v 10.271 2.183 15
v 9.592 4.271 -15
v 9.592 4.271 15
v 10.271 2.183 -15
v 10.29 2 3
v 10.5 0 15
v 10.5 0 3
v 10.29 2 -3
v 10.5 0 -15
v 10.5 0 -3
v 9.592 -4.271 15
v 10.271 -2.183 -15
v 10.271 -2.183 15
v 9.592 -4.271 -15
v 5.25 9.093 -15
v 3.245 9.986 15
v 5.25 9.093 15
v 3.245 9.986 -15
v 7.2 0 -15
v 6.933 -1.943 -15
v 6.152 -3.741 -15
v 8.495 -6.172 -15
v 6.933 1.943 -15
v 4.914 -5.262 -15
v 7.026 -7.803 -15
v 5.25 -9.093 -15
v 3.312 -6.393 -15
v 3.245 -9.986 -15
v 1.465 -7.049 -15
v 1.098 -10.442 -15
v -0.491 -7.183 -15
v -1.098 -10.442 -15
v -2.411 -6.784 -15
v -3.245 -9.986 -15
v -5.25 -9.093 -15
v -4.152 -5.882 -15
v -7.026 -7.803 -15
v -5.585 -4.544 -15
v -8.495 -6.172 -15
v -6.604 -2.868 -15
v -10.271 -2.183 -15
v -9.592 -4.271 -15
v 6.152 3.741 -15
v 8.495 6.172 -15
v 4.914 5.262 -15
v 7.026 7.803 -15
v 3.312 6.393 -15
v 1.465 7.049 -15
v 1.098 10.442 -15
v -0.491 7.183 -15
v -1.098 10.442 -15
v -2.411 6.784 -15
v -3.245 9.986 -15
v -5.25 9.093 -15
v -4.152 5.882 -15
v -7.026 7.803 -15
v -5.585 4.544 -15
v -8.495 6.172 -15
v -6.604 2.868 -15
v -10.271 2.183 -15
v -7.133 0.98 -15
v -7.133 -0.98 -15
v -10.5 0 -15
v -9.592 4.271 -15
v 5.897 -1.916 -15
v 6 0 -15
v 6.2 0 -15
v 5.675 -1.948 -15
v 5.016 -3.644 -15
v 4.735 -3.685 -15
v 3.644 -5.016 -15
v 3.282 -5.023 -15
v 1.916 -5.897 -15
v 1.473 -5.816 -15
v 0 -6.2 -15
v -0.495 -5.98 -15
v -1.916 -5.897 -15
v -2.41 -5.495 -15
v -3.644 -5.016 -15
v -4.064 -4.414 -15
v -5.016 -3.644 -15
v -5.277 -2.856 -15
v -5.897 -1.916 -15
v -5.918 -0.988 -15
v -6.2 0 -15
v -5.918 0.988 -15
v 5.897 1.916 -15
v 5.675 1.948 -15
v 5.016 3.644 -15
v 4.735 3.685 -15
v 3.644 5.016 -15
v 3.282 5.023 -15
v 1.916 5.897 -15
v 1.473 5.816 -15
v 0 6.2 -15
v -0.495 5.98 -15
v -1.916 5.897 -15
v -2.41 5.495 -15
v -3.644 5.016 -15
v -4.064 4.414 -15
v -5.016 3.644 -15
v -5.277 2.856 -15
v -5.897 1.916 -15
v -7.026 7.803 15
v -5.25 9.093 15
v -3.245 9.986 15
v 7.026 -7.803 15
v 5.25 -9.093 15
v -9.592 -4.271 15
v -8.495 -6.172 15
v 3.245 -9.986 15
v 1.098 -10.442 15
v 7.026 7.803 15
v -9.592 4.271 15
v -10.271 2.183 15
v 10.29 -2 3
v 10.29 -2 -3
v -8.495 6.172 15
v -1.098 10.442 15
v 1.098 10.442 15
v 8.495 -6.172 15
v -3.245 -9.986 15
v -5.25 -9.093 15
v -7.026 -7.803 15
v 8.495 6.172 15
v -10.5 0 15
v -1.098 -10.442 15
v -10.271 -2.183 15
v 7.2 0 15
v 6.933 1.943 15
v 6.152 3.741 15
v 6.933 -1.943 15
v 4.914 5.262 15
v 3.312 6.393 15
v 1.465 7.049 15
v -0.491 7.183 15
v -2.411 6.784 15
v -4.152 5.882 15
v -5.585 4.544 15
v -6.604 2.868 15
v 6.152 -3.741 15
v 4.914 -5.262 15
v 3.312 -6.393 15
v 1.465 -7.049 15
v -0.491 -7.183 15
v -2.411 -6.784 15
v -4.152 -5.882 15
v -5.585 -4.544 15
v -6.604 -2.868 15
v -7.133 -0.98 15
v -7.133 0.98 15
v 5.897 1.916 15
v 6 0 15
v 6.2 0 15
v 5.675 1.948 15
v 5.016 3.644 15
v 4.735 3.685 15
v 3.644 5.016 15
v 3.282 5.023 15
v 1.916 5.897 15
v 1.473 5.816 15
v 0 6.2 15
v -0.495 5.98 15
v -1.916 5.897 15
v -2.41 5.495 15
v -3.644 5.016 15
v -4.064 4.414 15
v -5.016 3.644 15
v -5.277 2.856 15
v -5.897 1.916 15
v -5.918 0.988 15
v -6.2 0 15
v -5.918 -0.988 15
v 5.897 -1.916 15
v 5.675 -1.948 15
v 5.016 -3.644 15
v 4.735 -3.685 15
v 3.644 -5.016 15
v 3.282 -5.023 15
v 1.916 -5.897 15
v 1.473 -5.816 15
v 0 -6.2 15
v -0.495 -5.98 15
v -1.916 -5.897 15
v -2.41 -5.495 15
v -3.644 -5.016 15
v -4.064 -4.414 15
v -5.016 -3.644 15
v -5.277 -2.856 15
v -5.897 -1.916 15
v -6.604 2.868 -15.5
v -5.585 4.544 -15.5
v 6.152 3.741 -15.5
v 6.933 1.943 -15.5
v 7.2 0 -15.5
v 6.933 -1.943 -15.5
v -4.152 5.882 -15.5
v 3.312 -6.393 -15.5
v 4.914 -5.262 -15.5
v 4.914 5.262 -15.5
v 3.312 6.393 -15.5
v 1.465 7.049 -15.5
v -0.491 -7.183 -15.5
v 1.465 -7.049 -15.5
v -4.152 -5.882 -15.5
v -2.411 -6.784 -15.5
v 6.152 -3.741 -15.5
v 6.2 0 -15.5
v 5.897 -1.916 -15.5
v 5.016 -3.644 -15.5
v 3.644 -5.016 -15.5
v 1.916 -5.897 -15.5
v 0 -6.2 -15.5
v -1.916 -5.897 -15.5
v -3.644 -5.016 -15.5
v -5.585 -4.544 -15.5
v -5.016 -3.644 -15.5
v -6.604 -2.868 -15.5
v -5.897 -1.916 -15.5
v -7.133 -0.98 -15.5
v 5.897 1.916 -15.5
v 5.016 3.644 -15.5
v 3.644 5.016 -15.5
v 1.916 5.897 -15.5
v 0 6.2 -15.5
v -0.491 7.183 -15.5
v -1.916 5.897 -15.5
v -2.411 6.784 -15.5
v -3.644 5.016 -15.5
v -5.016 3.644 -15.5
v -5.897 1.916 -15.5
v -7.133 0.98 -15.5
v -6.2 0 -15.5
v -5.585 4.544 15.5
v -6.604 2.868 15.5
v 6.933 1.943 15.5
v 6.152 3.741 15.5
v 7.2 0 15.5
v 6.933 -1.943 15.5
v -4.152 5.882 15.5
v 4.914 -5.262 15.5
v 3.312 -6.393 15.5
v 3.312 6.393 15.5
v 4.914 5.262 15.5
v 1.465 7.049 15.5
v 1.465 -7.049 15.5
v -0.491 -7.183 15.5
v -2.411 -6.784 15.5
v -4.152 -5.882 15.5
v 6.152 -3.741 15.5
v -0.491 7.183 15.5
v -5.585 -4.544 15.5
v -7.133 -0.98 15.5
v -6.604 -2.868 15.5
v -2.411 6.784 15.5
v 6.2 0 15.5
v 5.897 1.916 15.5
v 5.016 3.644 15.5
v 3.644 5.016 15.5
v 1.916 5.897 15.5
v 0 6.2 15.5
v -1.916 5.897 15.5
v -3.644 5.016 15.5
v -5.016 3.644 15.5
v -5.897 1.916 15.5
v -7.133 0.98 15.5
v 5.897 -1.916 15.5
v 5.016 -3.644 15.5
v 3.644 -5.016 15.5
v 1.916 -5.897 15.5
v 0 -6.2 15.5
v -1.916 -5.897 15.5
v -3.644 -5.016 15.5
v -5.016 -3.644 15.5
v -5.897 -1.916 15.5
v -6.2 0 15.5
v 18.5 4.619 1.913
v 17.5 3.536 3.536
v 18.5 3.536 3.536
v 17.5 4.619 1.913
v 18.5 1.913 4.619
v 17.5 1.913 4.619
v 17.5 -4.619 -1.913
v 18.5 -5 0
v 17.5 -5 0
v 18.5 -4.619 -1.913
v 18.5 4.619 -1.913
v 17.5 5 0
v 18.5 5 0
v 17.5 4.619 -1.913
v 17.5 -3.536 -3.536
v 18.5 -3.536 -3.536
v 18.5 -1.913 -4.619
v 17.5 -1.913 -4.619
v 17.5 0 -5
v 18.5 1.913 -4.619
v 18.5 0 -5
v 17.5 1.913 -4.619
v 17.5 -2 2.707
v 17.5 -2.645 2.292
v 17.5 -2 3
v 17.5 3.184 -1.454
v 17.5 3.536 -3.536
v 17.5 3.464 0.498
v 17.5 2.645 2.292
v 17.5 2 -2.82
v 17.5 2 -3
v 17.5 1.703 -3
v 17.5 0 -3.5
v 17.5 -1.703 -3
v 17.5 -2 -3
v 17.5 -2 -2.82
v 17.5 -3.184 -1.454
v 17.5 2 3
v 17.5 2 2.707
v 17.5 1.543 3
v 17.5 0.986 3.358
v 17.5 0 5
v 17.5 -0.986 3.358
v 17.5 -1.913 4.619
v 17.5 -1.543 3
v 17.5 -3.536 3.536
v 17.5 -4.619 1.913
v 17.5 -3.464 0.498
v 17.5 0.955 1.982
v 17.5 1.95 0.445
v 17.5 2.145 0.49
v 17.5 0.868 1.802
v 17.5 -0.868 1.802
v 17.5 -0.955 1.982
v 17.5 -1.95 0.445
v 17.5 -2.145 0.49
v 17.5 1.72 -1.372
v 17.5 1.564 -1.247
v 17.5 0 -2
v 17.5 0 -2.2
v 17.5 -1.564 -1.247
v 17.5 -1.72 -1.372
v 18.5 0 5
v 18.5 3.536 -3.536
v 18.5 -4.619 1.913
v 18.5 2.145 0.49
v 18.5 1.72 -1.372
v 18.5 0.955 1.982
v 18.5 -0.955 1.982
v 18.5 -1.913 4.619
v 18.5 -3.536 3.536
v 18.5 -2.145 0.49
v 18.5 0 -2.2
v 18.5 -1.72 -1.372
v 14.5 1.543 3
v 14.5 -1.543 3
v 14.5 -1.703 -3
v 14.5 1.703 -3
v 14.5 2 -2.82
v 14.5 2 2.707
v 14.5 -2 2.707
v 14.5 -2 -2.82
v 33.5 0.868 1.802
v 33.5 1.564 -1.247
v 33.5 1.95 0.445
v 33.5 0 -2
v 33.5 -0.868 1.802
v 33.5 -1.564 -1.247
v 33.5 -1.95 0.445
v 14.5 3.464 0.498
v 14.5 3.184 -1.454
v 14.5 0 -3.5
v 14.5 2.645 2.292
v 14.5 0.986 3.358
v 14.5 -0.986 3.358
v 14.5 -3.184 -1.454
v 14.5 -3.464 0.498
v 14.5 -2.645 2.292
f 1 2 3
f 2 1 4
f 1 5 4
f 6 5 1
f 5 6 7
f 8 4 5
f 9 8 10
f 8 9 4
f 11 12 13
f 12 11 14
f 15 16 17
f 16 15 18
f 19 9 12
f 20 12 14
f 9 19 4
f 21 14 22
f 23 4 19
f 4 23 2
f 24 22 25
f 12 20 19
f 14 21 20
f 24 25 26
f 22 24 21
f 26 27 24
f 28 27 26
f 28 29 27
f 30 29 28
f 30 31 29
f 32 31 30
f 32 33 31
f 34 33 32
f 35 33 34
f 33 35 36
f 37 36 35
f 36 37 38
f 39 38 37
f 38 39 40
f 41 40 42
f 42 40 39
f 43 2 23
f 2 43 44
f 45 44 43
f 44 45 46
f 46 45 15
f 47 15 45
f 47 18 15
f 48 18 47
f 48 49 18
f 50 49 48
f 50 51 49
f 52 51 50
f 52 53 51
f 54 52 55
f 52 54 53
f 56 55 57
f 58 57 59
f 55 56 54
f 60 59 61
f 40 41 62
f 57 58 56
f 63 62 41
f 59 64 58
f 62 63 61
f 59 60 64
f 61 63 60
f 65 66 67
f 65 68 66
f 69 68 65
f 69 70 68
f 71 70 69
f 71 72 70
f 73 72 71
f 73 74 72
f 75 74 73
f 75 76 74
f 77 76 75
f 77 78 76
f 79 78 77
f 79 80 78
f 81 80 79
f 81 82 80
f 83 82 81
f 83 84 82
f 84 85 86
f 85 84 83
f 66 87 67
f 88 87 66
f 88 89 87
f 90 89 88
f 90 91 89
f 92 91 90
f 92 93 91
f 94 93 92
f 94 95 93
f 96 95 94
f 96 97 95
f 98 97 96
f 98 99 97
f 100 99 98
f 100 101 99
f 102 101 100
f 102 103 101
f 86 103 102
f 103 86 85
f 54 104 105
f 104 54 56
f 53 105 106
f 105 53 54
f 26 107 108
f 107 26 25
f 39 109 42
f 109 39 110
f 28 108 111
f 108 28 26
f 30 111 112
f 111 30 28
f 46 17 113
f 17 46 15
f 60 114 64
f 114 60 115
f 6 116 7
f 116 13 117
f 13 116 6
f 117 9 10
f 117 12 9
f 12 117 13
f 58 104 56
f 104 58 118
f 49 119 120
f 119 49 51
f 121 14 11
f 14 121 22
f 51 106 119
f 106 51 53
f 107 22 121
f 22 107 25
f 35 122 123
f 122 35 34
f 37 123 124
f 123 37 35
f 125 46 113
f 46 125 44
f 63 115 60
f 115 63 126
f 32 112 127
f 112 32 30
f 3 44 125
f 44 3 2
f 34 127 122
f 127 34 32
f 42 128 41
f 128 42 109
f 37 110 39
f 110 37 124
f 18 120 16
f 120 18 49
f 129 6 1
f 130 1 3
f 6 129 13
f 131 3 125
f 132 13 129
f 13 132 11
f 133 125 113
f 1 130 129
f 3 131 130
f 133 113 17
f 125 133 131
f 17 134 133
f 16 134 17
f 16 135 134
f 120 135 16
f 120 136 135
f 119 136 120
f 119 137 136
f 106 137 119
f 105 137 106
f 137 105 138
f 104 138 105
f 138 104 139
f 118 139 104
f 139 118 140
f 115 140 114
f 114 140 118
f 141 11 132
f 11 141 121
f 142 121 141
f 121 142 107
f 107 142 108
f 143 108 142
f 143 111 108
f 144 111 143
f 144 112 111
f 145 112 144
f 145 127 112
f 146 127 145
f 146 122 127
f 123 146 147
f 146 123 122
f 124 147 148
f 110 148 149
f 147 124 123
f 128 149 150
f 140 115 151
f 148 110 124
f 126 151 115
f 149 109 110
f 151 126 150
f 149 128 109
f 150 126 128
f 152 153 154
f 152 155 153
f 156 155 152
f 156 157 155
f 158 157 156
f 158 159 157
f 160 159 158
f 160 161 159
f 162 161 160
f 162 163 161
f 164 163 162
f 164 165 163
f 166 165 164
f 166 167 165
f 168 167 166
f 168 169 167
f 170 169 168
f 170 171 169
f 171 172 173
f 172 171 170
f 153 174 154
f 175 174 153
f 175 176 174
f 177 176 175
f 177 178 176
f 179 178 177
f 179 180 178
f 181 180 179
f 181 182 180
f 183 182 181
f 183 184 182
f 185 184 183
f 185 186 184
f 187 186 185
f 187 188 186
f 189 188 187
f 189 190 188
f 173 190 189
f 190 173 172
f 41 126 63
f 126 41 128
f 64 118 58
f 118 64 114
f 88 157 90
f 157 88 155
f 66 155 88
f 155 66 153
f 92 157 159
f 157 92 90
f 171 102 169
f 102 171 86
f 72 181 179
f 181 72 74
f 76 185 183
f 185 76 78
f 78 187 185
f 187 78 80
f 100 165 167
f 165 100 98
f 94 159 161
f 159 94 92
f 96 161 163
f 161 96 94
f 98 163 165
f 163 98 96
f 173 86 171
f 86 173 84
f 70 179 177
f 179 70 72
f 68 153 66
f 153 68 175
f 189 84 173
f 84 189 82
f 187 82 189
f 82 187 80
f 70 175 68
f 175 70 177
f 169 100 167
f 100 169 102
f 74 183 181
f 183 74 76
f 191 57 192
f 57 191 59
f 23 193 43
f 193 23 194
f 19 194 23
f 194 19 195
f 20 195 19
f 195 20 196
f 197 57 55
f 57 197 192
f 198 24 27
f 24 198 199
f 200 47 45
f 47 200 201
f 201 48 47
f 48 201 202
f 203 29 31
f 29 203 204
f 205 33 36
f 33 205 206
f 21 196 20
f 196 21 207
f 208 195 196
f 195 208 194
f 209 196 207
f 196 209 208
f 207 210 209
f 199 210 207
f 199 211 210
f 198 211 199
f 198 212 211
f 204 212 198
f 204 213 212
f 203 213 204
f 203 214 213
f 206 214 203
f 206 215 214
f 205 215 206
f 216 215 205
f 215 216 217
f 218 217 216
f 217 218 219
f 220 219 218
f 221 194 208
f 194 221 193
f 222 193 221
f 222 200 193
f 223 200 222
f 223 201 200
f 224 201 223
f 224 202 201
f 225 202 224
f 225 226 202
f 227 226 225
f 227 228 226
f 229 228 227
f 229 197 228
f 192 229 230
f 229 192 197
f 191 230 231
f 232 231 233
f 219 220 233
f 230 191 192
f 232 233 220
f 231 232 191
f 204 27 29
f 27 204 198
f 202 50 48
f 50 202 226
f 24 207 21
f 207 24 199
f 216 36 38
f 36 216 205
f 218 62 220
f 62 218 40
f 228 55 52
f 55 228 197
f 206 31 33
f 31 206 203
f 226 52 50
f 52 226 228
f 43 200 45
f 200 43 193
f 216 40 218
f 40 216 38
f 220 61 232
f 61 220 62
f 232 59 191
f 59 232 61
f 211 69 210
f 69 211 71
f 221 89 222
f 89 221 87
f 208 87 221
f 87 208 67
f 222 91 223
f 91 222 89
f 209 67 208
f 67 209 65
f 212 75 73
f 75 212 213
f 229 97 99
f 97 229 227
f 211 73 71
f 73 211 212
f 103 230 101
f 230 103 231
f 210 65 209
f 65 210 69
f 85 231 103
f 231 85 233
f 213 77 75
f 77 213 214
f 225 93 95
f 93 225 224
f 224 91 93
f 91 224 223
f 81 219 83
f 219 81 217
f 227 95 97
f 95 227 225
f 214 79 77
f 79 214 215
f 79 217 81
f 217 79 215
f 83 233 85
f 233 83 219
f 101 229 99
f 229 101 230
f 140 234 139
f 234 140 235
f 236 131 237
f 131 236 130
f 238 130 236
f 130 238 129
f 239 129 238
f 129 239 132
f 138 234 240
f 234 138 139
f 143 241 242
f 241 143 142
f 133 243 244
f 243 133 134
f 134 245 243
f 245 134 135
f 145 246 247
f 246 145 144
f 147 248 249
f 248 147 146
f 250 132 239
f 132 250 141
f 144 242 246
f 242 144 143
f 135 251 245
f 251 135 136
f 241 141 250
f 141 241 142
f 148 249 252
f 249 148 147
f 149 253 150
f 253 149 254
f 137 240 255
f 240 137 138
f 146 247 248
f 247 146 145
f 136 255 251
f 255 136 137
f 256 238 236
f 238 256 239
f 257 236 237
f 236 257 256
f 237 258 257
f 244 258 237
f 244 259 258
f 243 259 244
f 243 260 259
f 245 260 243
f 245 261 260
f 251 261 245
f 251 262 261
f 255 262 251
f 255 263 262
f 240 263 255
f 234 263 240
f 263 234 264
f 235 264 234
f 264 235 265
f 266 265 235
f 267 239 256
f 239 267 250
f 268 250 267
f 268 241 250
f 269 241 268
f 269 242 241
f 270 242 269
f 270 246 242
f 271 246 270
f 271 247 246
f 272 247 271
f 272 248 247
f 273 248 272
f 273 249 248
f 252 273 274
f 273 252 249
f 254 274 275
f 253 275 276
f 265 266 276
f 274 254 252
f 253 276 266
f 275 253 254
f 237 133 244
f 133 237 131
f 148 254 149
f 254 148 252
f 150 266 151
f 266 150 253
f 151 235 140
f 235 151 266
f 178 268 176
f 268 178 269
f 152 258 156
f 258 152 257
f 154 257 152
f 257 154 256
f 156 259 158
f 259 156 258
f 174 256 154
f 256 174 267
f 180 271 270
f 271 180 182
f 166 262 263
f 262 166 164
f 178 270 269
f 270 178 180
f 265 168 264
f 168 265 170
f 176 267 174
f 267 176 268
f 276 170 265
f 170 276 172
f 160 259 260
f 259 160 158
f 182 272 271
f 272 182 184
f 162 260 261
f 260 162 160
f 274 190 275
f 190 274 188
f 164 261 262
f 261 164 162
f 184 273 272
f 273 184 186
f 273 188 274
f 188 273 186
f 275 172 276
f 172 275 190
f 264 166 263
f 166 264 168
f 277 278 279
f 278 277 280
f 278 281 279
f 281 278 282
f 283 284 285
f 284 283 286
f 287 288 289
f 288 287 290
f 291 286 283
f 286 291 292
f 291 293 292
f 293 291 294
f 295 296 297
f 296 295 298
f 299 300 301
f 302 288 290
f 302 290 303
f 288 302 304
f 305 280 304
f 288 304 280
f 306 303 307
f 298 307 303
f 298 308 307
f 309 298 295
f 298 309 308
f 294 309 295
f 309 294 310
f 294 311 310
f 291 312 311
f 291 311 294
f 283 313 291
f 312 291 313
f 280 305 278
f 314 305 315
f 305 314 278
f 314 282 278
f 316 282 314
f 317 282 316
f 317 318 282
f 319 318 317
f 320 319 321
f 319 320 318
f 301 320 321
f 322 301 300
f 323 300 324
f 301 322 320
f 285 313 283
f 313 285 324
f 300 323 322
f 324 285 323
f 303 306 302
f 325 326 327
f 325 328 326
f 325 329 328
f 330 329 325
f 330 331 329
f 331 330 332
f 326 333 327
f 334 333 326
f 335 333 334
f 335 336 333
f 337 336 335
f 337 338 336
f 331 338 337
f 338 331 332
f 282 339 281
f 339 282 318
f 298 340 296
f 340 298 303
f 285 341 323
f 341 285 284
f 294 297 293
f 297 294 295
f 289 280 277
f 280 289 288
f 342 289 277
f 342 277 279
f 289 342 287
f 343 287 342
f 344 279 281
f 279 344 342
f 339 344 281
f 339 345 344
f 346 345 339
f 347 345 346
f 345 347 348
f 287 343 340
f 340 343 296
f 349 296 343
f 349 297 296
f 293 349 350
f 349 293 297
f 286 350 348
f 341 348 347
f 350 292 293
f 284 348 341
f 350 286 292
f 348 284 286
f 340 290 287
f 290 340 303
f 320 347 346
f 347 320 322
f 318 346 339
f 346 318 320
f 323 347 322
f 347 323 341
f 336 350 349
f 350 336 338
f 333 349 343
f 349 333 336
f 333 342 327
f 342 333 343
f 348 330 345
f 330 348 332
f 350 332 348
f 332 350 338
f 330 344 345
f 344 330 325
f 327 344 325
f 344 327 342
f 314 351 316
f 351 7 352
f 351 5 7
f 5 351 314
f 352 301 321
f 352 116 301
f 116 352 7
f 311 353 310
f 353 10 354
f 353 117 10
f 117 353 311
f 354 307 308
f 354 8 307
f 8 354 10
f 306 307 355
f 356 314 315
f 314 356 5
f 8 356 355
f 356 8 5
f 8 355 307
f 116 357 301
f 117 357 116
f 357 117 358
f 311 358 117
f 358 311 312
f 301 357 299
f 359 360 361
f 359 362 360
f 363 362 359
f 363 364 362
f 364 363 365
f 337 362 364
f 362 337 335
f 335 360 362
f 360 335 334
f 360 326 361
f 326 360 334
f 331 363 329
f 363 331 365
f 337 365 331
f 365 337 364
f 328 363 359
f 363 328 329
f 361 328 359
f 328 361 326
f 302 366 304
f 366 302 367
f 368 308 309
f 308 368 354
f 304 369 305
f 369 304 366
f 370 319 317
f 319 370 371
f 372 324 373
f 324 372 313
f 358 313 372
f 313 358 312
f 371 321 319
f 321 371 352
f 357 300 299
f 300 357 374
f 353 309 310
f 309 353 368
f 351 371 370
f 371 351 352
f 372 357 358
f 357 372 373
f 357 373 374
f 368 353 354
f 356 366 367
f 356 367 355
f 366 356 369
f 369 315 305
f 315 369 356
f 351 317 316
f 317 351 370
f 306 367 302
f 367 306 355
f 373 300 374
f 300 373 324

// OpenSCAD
// Parameters
bore_diameter_mm = 12.0; //[6.0:24.0:0.1]
outer_diameter_mm = 21.0; //[10.5:42.0:0.1]
length_mm = 30.0; //[15.0:60.0:0.1]
centered = 1; //[0:1:1]
include_grooves = 0; //[0:1:1]
groove_count = 0; //[0:2:1]
eps_mm = 0.2; //[0.05:0.5:0.05]
overlap_mm = 1.0; //[0.5:2.0:0.1]
casing_wall_mm = 1.8; //[0.9:3.6:0.1]
seal_thickness_mm = 1.5; //[0.8:3.0:0.1]
seal_radial_mm = 1.2; //[0.6:2.4:0.1]
groove_depth_mm = 0.6; //[0.3:1.2:0.05]
groove_width_mm = 2.0; //[1.0:4.0:0.1]
groove_spacing_mm = 20.0; //[10.0:40.0:0.5]
screw_shank_d_mm = 4.0; //[2.0:8.0:0.1]
screw_length_mm = 16.0; //[8.0:32.0:0.5]
screw_head_d_mm = 7.0; //[4.0:14.0:0.1]
screw_head_h_mm = 3.0; //[1.5:6.0:0.1]
washer_od_mm = 10.0; //[6.0:20.0:0.1]
washer_thickness_mm = 1.0; //[0.5:2.5:0.1]
screw_mount_pad_w_mm = 8.0; //[4.0:16.0:0.1]
screw_mount_pad_h_mm = 6.0; //[3.0:12.0:0.1]
screw_mount_pad_t_mm = 4.0; //[2.0:8.0:0.1]

// Linear Bearing - complete geometry
module linear_bearing() {
  color([0.85, 0.85, 0.8]) {
    // Outer casing
    difference() {
      cylinder(r=outer_diameter_mm/2, h=length_mm, center=true);
      // Inner bore
      translate([0, 0, 0])
        cylinder(r=bore_diameter_mm/2, h=length_mm + 2*overlap_mm, center=true);
    }
    // End seals
    union() {
      difference() {
        translate([0, 0, -length_mm/2 + seal_thickness_mm/2 - overlap_mm/2])
          cylinder(r=bore_diameter_mm/2 + seal_radial_mm, h=seal_thickness_mm, center=true);
        translate([0, 0, -length_mm/2 + seal_thickness_mm/2 - overlap_mm/2])
          cylinder(r=bore_diameter_mm/2 + eps_mm, h=seal_thickness_mm + 2*overlap_mm, center=true);
      }
      difference() {
        translate([0, 0, length_mm/2 - seal_thickness_mm/2 + overlap_mm/2])
          cylinder(r=bore_diameter_mm/2 + seal_radial_mm, h=seal_thickness_mm, center=true);
        translate([0, 0, length_mm/2 - seal_thickness_mm/2 + overlap_mm/2])
          cylinder(r=bore_diameter_mm/2 + eps_mm, h=seal_thickness_mm + 2*overlap_mm, center=true);
      }
    }
    // Optional grooves
    if (include_grooves) {
      difference() {
        translate([0, 0, -groove_spacing_mm/2])
          cylinder(r=outer_diameter_mm/2, h=groove_width_mm, center=true);
        translate([0, 0, -groove_spacing_mm/2])
          cylinder(r=outer_diameter_mm/2 - groove_depth_mm, h=groove_width_mm + 2*overlap_mm, center=true);
      }
      difference() {
        translate([0, 0, groove_spacing_mm/2])
          cylinder(r=outer_diameter_mm/2, h=groove_width_mm, center=true);
        translate([0, 0, groove_spacing_mm/2])
          cylinder(r=outer_diameter_mm/2 - groove_depth_mm, h=groove_width_mm + 2*overlap_mm, center=true);
      }
    }
  }
}

// Screw and Washer - complete geometry
module screw_and_washer() {
  color([0.4, 0.4, 0.43]) {
    // Screw mount pad
    translate([outer_diameter_mm/2 + screw_mount_pad_w_mm/2 - overlap_mm, 0, 0])
      cube([screw_mount_pad_w_mm, screw_mount_pad_t_mm, screw_mount_pad_h_mm], center=true);
    // Screw shank
    translate([outer_diameter_mm/2 + screw_mount_pad_w_mm - overlap_mm + screw_length_mm/2, 0, 0])
      rotate([0, 90, 0])
      cylinder(r=screw_shank_d_mm/2, h=screw_length_mm, center=true);
    // Screw head
    translate([outer_diameter_mm/2 + screw_mount_pad_w_mm - overlap_mm - screw_head_h_mm/2, 0, 0])
      rotate([0, 90, 0])
      cylinder(r=screw_head_d_mm/2, h=screw_head_h_mm, center=true);
    // Washer
    difference() {
      translate([outer_diameter_mm/2 + screw_mount_pad_w_mm - overlap_mm + washer_thickness_mm/2, 0, 0])
        rotate([0, 90, 0])
        cylinder(r=washer_od_mm/2, h=washer_thickness_mm, center=true);
      translate([outer_diameter_mm/2 + screw_mount_pad_w_mm - overlap_mm + washer_thickness_mm/2, 0, 0])
        rotate([0, 90, 0])
        cylinder(r=screw_shank_d_mm/2 + eps_mm, h=washer_thickness_mm + 2*overlap_mm, center=true);
    }
  }
}

// Assembly
module assembly() {
  linear_bearing();
  screw_and_washer();
}

assembly();
